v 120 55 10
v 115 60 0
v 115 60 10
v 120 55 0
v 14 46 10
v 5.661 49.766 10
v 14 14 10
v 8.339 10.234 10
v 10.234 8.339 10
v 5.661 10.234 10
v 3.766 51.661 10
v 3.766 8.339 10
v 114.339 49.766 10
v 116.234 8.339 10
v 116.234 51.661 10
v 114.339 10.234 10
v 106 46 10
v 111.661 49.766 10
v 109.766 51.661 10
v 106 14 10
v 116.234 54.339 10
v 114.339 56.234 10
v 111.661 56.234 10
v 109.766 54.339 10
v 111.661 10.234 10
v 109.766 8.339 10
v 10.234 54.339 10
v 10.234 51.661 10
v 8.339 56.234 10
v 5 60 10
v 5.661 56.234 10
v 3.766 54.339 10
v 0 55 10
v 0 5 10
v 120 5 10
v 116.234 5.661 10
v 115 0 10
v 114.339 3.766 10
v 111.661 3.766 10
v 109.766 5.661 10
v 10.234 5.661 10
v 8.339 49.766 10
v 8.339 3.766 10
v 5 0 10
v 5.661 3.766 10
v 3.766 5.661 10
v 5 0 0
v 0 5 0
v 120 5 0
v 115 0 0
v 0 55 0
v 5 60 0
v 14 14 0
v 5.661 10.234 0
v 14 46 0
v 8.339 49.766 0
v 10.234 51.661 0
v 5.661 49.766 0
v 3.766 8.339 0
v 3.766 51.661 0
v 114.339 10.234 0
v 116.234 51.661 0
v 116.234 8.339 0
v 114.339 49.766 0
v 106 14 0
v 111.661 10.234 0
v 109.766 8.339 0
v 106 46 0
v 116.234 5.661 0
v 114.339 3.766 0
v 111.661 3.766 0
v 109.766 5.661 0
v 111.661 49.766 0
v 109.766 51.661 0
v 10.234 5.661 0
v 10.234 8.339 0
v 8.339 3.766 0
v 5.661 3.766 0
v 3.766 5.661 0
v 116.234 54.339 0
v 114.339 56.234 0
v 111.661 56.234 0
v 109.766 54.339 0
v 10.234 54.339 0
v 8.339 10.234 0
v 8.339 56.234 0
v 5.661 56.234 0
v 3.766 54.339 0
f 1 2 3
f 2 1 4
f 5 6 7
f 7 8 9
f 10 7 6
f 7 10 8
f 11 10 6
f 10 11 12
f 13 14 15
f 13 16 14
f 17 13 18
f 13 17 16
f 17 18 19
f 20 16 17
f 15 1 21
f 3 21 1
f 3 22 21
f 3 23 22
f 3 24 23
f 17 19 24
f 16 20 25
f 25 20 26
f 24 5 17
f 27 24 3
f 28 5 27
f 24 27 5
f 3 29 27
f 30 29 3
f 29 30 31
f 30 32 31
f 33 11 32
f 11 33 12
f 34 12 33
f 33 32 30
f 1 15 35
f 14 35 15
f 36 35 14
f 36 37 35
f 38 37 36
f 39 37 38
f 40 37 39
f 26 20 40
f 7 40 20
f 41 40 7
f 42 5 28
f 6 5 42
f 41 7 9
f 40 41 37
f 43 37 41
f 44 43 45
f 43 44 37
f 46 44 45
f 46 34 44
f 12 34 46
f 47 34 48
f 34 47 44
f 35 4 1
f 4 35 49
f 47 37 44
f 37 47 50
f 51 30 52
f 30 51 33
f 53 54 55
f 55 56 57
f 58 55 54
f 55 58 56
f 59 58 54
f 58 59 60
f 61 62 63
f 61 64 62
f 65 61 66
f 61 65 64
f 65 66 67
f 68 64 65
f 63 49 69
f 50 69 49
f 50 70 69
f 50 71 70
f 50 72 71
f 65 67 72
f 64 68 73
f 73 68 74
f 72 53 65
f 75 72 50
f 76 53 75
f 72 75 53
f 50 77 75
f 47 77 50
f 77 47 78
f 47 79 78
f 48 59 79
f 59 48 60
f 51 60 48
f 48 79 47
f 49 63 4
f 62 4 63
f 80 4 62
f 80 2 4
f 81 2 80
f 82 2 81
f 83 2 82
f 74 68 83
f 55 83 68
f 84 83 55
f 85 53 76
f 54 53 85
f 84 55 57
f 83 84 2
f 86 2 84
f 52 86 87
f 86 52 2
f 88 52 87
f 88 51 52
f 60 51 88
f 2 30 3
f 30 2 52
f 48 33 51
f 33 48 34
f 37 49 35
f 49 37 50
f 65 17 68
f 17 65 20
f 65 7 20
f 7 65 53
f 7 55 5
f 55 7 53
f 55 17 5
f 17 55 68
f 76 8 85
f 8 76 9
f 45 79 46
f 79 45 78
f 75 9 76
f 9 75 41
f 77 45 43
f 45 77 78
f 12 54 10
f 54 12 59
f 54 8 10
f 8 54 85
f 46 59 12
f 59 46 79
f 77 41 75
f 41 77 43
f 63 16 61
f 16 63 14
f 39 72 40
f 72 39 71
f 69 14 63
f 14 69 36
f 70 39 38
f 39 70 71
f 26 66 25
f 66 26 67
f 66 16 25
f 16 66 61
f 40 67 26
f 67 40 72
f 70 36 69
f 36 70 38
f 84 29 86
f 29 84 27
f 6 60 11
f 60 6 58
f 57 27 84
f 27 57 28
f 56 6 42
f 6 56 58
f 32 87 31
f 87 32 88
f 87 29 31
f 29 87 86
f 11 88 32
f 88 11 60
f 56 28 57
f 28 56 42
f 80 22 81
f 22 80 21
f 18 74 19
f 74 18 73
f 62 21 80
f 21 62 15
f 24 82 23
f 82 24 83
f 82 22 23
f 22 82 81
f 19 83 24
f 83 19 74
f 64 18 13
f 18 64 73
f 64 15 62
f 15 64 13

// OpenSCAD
$fn = 32;

// ----------------------------------------------------------------------
// Frame plate: 120 x 60 frame, 14 mm rails
// ----------------------------------------------------------------------

// --- parameters (mm) ---
plate_l = 120;            // plate length, X
plate_w = 60;             // plate width, Y
plate_t = 10;             // plate thickness, Z (extrusion height)
corner_c = 5;             // corner chamfer
frame_bar = 14;           // frame rail width
bolt_r = 3.5;             // corner bolt window radius
bolt_inset = 7;           // bolt centre inset from the edges
fit_tol = 0.1;            // declared fit tolerance (prompt contract)
free_tol = 0.5;           // declared free tolerance (prompt contract)

win_l = plate_l - 2 * frame_bar;  // window length
win_w = plate_w - 2 * frame_bar;  // window width
bolt_d = 2 * bolt_r;  // corner hole diameter

profile = [[5, 0], [115, 0], [120, 5], [120, 55], [115, 60], [5, 60], [0, 55], [0, 5]];  // primary outline, 8 points, counter clockwise
void_1 = [[14, 14], [106, 14], [106, 46], [14, 46]];  // the window, 4 points
void_2 = [[10.234, 8.339], [8.339, 10.234], [5.661, 10.234], [3.766, 8.339], [3.766, 5.661], [5.661, 3.766], [8.339, 3.766], [10.234, 5.661]];  // corner bolt window, 8 points
void_3 = [[116.234, 8.339], [114.339, 10.234], [111.661, 10.234], [109.766, 8.339], [109.766, 5.661], [111.661, 3.766], [114.339, 3.766], [116.234, 5.661]];  // corner bolt window, 8 points
void_4 = [[10.234, 54.339], [8.339, 56.234], [5.661, 56.234], [3.766, 54.339], [3.766, 51.661], [5.661, 49.766], [8.339, 49.766], [10.234, 51.661]];  // corner bolt window, 8 points
void_5 = [[116.234, 54.339], [114.339, 56.234], [111.661, 56.234], [109.766, 54.339], [109.766, 51.661], [111.661, 49.766], [114.339, 49.766], [116.234, 51.661]];  // corner bolt window, 8 points

// --- the one profile operation ---
difference() {
  linear_extrude(height = plate_t) polygon(points = profile);
  translate([0, 0, -1])
    linear_extrude(height = plate_t + 2) polygon(points = void_1);
  translate([0, 0, -1])
    linear_extrude(height = plate_t + 2) polygon(points = void_2);
  translate([0, 0, -1])
    linear_extrude(height = plate_t + 2) polygon(points = void_3);
  translate([0, 0, -1])
    linear_extrude(height = plate_t + 2) polygon(points = void_4);
  translate([0, 0, -1])
    linear_extrude(height = plate_t + 2) polygon(points = void_5);
}
